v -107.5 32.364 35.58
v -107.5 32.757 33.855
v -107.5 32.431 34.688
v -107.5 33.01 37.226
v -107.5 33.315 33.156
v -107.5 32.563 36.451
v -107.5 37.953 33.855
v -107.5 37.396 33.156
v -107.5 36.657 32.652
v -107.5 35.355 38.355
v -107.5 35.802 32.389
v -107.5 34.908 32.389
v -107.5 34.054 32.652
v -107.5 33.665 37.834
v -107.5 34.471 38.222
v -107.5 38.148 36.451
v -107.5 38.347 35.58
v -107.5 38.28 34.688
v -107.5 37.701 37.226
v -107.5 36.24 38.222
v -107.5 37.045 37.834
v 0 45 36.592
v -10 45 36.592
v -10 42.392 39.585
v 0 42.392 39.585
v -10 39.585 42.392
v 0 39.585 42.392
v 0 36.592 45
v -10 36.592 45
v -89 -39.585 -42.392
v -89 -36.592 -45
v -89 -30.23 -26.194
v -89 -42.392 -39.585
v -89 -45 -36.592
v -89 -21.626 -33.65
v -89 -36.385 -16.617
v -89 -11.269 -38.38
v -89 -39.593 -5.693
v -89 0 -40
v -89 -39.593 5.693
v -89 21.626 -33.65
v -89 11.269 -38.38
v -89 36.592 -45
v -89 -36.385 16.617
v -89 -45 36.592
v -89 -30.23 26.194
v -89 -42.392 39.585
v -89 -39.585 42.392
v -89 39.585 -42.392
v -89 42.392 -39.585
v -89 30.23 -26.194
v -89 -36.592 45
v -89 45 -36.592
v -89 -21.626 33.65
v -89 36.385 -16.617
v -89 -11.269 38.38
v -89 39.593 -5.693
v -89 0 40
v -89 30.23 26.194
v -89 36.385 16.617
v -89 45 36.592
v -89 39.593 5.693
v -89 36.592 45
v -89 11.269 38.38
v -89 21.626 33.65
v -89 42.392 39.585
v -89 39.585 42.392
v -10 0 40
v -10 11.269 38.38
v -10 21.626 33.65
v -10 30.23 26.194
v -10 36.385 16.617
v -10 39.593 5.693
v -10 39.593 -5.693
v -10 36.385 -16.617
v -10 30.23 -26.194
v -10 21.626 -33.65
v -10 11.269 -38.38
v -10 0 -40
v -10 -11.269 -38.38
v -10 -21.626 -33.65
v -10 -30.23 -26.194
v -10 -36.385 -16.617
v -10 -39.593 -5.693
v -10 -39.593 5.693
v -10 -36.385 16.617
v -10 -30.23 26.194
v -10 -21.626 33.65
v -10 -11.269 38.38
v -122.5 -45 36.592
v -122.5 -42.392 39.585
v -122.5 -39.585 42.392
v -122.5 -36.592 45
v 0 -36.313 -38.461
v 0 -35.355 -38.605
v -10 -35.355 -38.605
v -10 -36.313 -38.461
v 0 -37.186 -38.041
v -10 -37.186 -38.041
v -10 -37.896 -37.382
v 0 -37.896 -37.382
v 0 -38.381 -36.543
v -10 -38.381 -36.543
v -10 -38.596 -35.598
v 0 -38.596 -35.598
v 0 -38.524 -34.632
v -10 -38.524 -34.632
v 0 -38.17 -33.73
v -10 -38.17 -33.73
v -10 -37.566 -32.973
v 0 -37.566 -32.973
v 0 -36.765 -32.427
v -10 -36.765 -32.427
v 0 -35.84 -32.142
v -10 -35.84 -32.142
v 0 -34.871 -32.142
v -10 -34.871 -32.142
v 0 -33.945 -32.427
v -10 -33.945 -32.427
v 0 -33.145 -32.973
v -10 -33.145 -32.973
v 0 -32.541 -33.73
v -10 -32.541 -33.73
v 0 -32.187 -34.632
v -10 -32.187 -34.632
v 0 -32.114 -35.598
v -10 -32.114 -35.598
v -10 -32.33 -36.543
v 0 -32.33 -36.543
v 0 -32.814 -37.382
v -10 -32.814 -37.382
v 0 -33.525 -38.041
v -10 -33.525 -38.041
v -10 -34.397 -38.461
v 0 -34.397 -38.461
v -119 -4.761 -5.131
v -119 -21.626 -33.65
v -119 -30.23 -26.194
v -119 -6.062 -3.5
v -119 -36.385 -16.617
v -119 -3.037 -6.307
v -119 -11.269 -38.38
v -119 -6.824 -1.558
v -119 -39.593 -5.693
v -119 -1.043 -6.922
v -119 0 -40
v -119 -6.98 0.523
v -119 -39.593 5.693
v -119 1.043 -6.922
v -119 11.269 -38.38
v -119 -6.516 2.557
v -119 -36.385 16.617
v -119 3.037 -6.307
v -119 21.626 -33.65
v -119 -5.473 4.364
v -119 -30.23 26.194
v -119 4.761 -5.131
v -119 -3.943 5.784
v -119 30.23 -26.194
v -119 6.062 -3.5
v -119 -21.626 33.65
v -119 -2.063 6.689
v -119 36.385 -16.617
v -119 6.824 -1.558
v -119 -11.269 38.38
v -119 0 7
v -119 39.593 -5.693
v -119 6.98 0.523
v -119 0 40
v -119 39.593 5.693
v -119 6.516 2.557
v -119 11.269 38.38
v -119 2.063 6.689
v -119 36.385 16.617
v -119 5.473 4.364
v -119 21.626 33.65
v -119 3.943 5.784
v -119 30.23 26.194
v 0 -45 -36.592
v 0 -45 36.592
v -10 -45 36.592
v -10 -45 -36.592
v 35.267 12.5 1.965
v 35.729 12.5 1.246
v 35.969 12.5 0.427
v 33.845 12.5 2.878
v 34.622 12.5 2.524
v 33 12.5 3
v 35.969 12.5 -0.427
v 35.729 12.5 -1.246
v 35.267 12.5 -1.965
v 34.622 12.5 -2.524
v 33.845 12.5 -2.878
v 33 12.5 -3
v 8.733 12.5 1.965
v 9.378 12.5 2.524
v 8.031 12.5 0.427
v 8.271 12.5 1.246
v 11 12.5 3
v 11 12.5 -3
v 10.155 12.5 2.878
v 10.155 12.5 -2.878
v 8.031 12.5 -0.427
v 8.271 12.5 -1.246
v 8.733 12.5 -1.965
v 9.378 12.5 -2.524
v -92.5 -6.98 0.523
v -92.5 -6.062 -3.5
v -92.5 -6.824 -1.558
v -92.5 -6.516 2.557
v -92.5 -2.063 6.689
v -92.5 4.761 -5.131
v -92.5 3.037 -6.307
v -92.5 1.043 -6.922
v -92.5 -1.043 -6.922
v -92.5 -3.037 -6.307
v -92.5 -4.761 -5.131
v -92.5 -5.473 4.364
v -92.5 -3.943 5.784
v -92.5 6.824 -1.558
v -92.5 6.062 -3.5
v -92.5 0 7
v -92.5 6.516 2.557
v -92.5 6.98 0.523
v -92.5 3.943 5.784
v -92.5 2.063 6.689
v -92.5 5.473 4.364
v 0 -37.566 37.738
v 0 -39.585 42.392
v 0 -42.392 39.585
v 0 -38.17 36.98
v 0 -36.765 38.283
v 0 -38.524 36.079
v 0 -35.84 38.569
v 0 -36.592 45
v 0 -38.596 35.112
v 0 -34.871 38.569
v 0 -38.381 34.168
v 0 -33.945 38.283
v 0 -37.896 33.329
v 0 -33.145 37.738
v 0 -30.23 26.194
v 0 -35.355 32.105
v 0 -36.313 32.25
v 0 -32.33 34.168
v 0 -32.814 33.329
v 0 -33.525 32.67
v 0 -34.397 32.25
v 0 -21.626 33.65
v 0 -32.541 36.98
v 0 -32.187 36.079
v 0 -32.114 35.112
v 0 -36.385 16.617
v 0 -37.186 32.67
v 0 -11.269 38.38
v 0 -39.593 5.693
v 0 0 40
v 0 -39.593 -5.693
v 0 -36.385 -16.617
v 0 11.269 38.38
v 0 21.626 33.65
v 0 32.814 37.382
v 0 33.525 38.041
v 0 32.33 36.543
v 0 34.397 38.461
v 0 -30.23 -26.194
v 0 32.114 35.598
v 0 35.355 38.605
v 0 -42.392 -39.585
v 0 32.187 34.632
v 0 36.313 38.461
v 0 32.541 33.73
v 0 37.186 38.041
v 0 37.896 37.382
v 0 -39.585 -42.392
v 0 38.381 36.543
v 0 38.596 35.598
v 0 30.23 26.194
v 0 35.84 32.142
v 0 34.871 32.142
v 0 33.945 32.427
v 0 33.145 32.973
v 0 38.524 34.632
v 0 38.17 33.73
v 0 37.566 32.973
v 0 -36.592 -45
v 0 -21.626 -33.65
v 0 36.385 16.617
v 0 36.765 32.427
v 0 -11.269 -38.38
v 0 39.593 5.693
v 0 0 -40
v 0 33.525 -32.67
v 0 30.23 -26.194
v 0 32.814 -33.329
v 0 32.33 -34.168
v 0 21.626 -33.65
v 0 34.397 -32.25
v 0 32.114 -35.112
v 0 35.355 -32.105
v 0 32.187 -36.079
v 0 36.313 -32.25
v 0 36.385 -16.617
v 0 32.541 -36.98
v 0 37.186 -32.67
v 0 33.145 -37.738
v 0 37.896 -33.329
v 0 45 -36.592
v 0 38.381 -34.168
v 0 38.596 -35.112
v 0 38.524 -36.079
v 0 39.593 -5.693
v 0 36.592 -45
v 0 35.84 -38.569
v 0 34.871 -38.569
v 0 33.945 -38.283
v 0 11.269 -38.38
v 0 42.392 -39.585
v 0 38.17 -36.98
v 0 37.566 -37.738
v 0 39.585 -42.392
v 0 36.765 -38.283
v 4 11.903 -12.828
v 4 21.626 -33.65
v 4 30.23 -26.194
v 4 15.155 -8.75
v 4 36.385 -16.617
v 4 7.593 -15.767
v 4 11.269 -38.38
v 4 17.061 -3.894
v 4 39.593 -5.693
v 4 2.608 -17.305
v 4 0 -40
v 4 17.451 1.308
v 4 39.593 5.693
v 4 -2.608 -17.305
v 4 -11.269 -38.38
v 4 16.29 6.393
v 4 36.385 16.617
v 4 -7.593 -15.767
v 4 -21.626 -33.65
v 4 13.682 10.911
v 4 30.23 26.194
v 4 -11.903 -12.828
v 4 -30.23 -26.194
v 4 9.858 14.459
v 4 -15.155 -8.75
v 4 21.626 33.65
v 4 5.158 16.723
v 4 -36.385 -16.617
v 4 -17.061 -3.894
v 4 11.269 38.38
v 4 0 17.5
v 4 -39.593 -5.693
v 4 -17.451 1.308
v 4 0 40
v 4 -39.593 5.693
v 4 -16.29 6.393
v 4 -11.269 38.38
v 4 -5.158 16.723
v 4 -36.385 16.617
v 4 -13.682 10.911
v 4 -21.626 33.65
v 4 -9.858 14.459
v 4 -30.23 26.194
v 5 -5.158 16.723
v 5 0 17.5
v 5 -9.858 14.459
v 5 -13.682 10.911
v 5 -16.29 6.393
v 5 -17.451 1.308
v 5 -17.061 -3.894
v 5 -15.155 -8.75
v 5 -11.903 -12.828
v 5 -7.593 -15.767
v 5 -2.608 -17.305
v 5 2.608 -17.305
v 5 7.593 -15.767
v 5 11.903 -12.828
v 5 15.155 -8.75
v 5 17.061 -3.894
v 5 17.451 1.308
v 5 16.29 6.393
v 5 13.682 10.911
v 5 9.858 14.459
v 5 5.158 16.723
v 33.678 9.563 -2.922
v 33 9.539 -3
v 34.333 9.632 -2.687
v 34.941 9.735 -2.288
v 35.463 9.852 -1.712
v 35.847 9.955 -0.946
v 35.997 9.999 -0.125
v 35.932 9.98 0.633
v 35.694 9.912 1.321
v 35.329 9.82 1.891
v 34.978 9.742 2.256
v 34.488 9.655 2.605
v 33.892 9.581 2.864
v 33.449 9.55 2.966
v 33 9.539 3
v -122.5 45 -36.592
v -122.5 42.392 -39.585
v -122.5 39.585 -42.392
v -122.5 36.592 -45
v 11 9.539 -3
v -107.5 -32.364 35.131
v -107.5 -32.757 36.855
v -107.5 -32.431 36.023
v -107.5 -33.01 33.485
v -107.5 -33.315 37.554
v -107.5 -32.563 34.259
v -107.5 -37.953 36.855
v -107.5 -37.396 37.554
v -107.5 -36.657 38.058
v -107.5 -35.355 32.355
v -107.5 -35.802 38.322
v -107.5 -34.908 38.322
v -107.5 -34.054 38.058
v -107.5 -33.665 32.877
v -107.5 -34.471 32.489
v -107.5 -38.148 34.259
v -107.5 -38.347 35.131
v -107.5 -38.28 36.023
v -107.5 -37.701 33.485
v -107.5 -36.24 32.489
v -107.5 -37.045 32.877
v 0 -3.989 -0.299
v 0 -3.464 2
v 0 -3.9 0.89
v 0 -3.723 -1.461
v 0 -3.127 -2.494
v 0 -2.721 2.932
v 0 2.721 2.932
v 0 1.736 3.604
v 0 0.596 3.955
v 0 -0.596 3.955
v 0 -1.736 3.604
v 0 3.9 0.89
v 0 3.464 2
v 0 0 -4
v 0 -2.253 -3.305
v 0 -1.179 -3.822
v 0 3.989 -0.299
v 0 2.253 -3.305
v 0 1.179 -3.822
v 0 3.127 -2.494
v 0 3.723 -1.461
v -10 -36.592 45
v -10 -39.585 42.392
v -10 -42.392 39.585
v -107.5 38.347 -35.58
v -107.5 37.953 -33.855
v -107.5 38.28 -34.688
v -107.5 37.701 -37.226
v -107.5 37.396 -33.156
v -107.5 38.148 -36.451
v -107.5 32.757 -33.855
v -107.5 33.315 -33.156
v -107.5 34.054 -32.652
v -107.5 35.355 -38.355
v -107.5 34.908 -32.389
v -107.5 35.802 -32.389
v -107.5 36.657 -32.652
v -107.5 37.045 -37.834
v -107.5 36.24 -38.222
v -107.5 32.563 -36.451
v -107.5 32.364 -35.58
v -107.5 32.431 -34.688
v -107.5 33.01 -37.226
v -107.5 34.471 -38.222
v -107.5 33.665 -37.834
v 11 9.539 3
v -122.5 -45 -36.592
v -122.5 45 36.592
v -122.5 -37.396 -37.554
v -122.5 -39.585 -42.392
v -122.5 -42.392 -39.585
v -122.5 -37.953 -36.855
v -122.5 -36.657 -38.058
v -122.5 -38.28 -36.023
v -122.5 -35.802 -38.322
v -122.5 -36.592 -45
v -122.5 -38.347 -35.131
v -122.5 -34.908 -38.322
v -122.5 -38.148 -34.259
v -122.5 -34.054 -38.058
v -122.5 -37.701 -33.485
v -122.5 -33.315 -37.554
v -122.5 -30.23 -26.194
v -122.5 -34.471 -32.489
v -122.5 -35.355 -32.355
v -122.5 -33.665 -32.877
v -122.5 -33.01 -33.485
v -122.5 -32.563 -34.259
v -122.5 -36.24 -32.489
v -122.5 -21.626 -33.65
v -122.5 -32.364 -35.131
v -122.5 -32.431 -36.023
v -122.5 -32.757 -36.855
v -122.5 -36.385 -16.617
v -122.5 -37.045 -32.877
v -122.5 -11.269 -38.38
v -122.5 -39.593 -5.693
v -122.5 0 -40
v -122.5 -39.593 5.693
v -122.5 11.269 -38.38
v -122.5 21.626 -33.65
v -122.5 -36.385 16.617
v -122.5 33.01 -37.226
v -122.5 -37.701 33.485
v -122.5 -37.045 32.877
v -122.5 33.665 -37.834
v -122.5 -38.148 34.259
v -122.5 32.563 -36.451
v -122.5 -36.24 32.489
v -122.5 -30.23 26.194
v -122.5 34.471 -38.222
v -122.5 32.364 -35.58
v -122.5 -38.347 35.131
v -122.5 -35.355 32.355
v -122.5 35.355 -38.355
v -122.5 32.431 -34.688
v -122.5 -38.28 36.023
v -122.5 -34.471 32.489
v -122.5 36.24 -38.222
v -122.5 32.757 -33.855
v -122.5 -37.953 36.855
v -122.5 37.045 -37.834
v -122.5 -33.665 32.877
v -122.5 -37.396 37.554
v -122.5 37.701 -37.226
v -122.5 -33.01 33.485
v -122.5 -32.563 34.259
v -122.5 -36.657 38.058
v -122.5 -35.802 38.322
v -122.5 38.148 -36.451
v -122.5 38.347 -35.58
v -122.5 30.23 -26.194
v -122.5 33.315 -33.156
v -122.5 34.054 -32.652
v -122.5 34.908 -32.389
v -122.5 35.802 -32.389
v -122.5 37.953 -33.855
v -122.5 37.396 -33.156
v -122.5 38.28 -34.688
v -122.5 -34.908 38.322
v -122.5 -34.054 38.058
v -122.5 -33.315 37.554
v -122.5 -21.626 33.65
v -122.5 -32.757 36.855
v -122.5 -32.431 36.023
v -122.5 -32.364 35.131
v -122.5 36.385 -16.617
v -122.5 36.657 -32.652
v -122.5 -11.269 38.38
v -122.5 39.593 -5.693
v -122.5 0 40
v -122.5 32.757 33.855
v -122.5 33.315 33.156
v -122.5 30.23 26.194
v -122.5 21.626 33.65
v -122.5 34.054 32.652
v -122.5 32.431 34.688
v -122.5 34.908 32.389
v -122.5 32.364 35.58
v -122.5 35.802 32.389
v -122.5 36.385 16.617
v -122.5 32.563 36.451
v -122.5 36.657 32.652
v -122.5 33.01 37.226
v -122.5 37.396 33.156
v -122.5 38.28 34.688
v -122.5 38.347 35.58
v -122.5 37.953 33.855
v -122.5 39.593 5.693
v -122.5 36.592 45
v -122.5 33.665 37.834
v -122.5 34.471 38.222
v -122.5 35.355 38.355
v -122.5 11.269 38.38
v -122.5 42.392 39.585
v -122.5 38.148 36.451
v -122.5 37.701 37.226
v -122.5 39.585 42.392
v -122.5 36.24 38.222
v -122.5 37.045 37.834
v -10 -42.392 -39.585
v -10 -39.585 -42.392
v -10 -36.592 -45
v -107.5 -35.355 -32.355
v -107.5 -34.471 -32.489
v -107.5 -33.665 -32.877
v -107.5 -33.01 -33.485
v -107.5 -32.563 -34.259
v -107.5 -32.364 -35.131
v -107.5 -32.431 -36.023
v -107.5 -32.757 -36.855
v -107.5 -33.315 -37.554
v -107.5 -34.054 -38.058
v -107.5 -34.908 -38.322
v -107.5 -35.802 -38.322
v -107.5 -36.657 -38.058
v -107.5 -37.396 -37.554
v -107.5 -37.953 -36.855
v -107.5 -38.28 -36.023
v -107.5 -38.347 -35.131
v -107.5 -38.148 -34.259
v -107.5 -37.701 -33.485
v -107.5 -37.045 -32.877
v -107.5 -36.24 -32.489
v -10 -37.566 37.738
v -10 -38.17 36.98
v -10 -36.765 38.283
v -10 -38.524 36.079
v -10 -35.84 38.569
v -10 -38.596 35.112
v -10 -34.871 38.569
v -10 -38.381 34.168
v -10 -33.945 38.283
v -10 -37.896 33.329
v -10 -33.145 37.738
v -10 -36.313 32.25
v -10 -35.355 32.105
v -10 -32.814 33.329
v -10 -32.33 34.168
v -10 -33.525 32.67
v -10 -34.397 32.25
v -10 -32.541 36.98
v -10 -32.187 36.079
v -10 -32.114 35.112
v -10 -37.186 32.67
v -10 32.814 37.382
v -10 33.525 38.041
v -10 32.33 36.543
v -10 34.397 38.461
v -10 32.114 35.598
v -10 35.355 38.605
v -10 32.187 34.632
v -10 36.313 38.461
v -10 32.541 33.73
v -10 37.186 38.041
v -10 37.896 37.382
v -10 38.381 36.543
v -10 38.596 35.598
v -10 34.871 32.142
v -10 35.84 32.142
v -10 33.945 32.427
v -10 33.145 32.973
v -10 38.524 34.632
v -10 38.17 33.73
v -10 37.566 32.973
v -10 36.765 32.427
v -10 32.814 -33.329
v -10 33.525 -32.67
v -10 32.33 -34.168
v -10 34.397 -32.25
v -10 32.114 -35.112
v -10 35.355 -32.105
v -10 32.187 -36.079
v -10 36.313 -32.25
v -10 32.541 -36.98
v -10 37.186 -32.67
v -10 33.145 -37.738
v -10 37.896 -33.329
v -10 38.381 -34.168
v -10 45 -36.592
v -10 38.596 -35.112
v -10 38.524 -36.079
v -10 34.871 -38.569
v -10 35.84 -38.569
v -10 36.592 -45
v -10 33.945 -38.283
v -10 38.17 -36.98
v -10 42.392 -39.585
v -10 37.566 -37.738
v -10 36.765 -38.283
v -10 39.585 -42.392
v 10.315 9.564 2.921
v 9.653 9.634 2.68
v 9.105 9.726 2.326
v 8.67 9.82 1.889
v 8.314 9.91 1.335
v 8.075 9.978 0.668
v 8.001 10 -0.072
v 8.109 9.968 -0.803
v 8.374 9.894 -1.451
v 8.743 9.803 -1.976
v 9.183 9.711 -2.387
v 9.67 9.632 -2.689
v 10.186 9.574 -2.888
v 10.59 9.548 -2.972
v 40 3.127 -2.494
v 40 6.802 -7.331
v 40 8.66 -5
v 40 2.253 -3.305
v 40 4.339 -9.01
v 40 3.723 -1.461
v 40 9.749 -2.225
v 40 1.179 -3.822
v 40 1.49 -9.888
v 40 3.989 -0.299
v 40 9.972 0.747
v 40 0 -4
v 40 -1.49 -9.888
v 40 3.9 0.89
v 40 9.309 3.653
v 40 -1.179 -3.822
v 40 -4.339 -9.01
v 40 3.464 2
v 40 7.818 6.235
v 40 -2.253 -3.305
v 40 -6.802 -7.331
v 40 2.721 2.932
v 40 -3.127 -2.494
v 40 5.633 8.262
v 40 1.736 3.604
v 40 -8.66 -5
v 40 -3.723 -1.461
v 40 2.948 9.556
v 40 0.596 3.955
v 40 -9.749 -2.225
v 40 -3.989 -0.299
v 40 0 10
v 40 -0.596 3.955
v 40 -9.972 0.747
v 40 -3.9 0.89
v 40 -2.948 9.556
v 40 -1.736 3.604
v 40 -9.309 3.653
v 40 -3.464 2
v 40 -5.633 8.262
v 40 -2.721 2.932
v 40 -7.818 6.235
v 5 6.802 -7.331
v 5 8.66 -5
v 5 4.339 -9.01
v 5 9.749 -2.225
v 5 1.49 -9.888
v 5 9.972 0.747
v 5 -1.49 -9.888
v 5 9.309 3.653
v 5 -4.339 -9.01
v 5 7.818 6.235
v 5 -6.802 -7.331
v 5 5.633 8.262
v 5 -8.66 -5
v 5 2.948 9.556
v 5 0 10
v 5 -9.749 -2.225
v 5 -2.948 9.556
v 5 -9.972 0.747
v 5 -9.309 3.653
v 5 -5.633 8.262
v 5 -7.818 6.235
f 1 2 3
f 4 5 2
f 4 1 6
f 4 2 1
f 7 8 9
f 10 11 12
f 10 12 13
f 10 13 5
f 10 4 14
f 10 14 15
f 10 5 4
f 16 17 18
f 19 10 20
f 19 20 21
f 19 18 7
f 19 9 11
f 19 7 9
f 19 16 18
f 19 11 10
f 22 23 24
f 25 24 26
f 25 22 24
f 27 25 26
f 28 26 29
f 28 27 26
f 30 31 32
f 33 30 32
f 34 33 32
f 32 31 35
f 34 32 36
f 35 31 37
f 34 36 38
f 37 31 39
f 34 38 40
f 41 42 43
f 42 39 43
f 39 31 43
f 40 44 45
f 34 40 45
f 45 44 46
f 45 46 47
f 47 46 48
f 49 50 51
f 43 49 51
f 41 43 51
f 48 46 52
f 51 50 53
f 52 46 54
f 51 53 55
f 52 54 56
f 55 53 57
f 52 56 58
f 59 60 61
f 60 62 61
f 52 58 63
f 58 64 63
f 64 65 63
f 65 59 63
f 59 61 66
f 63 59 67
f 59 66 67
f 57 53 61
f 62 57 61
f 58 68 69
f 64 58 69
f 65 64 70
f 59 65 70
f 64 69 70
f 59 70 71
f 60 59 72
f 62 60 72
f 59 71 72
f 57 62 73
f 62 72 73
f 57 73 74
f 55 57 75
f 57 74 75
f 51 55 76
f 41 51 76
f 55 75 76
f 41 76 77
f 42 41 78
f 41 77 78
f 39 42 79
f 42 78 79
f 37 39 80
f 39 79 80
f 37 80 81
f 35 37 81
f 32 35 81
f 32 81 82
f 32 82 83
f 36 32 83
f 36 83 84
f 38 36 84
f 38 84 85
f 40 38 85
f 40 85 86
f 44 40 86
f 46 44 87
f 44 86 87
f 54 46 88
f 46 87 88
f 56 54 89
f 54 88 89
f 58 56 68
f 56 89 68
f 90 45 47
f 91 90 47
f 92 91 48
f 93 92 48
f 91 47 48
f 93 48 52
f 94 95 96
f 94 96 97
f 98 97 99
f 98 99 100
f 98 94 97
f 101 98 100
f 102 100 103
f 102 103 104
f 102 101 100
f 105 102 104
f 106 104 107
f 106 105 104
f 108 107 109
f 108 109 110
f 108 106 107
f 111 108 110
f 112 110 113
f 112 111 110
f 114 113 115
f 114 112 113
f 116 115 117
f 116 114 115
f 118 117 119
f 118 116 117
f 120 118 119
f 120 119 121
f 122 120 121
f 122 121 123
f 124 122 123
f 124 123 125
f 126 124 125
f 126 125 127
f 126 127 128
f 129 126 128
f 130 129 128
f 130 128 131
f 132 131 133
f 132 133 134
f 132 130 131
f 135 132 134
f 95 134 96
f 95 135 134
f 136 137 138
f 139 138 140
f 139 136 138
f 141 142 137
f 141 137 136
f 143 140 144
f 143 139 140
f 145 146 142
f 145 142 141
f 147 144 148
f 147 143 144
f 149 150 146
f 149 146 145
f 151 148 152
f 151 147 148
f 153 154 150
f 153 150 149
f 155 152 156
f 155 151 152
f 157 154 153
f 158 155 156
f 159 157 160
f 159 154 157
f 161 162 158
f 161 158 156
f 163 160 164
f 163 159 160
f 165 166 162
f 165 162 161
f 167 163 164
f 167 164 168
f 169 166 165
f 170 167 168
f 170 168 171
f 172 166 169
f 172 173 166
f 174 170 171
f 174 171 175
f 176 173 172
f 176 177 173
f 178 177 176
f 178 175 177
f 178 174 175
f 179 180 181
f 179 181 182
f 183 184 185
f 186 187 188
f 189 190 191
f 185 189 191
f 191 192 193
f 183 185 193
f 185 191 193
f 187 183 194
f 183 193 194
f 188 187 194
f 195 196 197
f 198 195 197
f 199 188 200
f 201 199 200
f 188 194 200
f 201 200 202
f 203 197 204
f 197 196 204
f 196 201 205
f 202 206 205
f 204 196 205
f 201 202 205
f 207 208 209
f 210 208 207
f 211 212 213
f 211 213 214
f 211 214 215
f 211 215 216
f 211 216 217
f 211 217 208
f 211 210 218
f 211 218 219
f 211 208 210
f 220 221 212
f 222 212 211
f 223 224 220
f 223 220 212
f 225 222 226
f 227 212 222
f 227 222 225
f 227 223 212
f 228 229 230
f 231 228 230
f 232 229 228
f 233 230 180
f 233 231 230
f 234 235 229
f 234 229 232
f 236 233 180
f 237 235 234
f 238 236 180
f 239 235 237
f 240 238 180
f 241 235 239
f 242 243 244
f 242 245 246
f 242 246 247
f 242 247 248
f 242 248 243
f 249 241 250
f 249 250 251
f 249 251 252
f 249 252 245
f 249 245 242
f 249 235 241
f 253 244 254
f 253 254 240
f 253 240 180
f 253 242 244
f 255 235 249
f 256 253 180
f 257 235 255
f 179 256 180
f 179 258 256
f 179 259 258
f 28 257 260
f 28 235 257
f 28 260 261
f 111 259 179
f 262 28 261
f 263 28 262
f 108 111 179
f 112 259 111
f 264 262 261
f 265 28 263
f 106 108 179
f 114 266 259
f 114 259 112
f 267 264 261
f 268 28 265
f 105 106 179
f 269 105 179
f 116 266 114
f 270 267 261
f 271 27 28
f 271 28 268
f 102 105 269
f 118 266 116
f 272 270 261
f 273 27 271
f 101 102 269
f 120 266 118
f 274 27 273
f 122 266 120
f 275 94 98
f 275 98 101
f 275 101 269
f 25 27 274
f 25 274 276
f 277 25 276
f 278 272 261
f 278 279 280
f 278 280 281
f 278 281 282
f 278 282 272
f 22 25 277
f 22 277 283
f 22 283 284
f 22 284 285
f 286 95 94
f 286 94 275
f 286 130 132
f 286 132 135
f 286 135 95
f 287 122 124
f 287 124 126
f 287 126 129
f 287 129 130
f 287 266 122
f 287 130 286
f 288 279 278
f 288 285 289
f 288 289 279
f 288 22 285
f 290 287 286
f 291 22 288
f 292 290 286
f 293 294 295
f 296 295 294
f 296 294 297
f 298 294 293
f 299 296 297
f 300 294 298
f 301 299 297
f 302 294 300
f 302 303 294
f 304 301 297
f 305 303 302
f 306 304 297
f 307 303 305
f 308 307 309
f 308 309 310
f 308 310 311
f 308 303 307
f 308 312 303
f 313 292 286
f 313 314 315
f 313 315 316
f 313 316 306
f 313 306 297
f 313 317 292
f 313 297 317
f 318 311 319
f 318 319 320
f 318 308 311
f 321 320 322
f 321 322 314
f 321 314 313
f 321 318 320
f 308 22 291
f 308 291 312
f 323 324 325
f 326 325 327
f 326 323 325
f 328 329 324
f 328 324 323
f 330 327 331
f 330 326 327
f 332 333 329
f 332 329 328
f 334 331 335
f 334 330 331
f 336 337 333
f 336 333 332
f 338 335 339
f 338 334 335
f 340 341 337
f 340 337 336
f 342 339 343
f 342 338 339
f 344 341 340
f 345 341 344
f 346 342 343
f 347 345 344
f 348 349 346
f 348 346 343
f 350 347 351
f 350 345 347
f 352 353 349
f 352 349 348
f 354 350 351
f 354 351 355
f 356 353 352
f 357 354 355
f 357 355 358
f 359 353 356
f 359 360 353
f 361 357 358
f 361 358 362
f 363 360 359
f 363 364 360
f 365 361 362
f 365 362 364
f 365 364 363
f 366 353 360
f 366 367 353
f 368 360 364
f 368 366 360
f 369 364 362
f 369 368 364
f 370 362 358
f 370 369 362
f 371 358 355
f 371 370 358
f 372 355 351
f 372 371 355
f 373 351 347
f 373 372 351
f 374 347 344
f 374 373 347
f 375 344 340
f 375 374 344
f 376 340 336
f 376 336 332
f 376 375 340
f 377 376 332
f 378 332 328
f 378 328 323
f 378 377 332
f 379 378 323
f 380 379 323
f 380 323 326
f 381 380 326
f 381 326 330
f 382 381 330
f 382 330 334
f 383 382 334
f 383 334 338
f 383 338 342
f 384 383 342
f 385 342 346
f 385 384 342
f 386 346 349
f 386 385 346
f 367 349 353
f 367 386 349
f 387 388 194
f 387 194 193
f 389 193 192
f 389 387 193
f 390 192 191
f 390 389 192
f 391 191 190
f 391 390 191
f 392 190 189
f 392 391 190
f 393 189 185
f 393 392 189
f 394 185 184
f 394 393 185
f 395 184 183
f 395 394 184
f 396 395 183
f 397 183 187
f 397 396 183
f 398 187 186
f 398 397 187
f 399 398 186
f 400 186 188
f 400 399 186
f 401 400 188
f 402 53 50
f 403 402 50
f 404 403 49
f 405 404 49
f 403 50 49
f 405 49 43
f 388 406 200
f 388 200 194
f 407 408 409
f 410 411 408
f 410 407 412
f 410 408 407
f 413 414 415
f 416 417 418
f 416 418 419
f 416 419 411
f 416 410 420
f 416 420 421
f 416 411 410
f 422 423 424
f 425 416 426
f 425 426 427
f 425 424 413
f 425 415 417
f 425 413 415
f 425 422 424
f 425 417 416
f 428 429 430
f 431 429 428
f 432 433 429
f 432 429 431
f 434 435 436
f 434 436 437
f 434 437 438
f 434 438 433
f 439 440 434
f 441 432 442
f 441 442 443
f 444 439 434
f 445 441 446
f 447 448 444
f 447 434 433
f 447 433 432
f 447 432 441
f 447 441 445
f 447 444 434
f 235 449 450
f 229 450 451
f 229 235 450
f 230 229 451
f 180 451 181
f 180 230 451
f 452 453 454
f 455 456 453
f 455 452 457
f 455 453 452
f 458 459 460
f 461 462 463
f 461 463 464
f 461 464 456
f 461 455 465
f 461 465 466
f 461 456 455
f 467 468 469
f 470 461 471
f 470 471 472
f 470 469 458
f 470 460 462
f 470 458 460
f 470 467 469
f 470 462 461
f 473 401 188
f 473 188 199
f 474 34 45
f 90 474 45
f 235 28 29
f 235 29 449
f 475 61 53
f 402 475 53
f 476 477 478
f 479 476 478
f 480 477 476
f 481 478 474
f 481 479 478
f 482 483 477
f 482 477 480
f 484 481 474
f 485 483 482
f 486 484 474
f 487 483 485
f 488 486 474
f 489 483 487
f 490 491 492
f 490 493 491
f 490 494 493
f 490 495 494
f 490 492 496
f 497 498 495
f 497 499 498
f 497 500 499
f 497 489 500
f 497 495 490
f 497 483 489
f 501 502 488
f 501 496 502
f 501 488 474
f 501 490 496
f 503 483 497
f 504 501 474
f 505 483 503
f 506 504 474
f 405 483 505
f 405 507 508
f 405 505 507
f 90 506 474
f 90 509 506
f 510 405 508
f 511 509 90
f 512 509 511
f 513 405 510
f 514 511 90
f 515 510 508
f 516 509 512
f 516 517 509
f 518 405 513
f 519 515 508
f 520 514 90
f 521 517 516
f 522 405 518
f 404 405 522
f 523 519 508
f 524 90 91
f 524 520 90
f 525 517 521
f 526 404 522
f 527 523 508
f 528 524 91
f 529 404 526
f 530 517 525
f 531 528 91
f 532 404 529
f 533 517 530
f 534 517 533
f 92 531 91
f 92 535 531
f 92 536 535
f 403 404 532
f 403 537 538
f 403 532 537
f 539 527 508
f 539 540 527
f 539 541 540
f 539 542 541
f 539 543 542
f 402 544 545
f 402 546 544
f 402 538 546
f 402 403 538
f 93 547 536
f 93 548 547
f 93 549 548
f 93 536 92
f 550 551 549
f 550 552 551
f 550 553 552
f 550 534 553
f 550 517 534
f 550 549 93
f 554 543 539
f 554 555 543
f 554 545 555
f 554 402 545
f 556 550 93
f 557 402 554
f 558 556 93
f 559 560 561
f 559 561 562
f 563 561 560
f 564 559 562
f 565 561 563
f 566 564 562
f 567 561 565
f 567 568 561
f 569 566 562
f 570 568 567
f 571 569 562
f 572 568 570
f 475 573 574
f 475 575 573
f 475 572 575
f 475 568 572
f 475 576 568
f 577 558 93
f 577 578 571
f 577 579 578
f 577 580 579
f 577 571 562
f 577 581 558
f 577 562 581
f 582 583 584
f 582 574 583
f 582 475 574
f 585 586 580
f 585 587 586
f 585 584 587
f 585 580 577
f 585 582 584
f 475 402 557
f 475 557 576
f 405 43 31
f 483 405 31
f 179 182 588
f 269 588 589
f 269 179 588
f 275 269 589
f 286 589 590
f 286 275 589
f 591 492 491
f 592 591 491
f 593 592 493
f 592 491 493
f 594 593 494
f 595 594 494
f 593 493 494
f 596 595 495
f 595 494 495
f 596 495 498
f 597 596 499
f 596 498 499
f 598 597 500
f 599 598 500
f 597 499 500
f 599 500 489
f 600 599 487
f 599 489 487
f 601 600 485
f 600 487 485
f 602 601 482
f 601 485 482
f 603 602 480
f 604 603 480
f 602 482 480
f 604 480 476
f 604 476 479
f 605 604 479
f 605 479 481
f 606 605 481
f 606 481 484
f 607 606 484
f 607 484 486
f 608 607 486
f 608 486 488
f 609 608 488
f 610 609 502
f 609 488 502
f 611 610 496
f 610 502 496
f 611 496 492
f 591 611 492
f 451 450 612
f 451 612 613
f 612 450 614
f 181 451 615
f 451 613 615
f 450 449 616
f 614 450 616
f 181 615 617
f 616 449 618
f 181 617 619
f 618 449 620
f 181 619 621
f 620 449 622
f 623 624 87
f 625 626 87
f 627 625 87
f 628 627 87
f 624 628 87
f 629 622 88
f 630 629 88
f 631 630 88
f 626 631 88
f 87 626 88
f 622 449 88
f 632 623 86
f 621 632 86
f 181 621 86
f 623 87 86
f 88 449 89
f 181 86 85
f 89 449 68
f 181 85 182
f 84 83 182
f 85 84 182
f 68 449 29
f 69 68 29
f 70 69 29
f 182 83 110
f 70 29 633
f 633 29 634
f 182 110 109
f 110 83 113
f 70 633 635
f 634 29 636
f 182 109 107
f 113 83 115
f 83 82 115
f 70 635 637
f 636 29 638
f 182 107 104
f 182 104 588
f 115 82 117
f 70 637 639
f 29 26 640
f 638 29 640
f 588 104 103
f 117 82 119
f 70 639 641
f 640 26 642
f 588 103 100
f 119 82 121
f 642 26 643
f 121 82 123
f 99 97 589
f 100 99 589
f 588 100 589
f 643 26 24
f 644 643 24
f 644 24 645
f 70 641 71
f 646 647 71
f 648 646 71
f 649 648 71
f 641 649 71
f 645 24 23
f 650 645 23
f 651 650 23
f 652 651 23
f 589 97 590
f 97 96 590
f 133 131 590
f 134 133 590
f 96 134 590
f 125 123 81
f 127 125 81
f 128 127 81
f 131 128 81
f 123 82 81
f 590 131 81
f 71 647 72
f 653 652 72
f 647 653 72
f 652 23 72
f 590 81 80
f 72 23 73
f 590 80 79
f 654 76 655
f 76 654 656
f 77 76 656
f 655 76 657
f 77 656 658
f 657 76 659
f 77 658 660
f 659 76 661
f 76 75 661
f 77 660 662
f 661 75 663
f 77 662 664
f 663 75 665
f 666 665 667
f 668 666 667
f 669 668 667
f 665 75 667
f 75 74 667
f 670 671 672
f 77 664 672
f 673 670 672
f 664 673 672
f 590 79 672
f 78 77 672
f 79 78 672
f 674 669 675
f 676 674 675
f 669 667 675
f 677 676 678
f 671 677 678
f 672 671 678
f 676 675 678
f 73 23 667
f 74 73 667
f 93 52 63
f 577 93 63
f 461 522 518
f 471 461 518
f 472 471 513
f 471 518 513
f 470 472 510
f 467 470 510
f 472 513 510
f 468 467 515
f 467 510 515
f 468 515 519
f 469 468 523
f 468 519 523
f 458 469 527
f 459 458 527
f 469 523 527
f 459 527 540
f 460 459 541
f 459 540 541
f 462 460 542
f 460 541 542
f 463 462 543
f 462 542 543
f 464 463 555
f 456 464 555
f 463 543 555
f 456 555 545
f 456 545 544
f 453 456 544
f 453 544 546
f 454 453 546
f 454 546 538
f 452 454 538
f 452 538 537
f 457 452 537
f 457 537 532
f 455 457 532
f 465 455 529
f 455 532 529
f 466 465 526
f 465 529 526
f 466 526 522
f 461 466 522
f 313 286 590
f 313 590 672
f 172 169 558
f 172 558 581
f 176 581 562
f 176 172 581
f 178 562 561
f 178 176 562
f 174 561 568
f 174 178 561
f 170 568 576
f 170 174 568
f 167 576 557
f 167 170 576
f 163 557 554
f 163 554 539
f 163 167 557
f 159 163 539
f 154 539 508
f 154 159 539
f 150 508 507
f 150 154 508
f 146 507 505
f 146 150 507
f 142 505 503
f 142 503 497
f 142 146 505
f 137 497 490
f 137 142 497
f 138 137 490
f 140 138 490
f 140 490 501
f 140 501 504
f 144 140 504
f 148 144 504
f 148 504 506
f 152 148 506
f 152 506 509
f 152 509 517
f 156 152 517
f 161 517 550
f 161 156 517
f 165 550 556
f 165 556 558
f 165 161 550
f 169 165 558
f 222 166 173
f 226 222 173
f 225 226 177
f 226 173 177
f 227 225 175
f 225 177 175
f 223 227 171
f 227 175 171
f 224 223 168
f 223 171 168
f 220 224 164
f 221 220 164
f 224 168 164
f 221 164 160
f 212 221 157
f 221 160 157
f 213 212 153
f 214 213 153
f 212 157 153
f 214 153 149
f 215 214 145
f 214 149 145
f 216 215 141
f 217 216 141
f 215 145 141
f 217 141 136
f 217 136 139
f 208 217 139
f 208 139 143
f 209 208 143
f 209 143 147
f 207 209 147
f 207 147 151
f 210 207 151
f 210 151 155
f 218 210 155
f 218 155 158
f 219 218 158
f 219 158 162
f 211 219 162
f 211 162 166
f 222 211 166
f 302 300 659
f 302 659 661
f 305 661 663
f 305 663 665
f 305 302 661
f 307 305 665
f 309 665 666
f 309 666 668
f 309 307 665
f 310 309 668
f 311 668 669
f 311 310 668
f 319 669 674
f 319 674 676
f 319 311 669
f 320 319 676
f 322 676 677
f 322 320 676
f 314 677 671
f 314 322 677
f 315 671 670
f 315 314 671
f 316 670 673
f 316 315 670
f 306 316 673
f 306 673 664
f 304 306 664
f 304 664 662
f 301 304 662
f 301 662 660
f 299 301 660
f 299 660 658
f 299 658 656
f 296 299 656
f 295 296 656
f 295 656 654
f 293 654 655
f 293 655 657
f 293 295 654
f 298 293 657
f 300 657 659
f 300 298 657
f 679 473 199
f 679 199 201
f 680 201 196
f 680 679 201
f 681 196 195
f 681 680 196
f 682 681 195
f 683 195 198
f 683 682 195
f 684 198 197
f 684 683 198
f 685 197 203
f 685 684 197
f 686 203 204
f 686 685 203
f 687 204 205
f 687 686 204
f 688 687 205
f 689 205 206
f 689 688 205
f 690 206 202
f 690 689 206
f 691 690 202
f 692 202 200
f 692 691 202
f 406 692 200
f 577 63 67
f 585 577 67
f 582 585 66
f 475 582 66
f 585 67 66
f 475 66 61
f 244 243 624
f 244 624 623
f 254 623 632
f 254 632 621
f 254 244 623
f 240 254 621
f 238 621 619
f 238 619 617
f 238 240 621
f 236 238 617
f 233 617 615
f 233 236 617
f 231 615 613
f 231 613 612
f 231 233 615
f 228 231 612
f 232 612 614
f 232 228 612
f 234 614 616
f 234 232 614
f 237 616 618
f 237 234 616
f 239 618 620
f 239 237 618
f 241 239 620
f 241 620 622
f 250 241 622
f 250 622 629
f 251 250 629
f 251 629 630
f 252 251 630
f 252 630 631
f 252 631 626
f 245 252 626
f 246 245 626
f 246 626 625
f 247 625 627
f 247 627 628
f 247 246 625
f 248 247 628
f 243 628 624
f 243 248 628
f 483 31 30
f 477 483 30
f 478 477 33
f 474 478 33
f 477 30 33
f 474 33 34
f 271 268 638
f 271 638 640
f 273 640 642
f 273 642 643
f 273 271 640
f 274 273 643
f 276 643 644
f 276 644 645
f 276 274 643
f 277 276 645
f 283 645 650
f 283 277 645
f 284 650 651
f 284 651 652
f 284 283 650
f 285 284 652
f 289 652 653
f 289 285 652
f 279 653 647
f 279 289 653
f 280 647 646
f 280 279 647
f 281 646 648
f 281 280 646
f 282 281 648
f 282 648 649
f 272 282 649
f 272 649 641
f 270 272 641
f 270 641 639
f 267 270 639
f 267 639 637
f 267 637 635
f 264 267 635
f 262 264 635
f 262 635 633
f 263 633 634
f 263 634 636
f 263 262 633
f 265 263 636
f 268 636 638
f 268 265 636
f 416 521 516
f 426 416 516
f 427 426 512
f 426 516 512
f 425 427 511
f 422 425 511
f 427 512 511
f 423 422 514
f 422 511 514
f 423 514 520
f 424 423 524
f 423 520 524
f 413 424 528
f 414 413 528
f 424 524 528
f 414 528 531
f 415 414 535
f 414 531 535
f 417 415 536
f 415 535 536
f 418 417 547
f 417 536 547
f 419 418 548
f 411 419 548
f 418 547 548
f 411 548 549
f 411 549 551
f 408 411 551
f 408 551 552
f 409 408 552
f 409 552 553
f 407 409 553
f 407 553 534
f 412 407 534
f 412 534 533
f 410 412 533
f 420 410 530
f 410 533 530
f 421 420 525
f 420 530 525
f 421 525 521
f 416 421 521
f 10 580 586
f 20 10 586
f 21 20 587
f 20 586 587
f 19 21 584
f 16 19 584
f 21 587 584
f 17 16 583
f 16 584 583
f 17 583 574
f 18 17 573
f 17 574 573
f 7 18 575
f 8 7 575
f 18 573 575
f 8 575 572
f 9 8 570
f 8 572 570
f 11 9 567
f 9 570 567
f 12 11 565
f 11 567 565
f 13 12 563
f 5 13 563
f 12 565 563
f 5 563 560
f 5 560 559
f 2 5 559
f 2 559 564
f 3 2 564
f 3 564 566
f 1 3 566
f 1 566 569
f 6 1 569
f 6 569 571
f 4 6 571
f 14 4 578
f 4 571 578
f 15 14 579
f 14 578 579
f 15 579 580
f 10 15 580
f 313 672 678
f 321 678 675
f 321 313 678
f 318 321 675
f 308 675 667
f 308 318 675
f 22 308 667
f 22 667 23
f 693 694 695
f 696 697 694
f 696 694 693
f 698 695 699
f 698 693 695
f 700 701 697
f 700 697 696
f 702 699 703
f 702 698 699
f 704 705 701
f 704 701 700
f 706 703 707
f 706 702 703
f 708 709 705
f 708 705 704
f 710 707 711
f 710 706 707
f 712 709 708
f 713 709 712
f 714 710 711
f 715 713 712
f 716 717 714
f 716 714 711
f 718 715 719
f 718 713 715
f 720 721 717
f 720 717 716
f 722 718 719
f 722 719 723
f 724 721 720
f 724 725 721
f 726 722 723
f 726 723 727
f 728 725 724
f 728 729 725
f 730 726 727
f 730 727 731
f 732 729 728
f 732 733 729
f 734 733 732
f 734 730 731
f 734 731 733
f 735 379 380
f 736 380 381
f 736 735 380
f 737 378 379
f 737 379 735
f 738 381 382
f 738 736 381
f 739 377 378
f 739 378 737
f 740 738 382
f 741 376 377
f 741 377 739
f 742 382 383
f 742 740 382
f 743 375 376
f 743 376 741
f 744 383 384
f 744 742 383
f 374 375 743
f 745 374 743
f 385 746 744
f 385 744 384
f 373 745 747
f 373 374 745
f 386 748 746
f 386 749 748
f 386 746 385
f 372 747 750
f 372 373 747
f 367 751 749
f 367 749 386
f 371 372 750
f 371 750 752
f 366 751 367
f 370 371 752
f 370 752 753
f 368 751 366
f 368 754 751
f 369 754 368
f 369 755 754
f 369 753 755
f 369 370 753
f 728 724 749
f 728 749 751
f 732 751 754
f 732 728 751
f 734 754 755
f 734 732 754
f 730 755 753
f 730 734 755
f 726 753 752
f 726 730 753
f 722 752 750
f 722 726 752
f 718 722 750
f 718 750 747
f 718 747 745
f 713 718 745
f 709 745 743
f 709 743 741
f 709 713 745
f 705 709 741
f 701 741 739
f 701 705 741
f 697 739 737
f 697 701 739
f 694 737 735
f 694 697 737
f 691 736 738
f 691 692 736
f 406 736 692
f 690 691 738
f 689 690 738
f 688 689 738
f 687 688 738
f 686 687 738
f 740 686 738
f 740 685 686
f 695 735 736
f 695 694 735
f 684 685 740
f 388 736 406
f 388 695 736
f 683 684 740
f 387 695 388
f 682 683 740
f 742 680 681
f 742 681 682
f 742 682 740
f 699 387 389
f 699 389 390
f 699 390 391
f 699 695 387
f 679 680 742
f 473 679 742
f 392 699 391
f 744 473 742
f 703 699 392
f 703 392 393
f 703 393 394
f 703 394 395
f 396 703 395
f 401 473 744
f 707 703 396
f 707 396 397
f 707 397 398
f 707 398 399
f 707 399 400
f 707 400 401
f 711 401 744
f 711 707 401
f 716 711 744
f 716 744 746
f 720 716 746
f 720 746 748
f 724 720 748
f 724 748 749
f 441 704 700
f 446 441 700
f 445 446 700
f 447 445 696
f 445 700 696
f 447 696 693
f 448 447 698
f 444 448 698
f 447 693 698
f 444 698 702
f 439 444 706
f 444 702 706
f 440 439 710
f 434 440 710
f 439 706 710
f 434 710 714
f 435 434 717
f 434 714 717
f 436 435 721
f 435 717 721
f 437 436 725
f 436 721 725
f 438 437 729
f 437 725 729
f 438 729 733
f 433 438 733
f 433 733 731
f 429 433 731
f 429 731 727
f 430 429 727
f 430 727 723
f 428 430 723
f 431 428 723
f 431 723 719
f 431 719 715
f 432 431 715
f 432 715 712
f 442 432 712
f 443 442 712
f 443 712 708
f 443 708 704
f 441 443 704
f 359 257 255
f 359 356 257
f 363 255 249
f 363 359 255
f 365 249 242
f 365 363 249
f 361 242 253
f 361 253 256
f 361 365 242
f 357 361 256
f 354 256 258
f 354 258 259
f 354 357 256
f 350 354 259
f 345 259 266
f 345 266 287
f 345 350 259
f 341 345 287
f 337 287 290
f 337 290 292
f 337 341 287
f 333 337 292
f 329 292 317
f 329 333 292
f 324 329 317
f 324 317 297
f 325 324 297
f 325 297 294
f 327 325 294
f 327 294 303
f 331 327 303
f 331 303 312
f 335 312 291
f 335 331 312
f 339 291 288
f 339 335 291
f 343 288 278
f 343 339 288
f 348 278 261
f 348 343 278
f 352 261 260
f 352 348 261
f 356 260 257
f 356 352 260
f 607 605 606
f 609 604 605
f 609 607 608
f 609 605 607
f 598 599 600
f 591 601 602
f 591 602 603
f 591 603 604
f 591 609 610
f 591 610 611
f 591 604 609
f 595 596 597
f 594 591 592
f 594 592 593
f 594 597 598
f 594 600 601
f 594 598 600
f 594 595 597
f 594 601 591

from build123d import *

# Parameters (mm, degrees)
EXTRUDE_1_DEPTH     = 12.5
CUT_EXTRUDE_1_REACH = 71.282
SKETCH_3_R          = 4
SKETCH_4_R          = 3.25
EXTRUDE_2_DEPTH     = 10
SKETCH_5_R          = 40
EXTRUDE_3_DEPTH     = 79
EXTRUDE_4_DEPTH     = 33.5
CUT_EXTRUDE_START   = -3.5
SKETCH_7_R          = 40
CUT_EXTRUDE_2_DEPTH = 3.5
SKETCH_8_R          = 7
CUT_EXTRUDE_3_DEPTH = 30
SKETCH_9_R          = 3
CUT_EXTRUDE_4_DEPTH = 15


with BuildPart() as part:
    # 草图1 → 旋转1 (revolve)
    with BuildSketch(Plane.XY, mode=Mode.PRIVATE) as revolve_1_sk:
        Polygon((0, 0), (0, 40), (4, 40), (4, 17.5), (5, 17.5), (5, 10), (40, 10), (40, 0), align=None)
    revolve(revolve_1_sk.sketch.rotate(Axis((-53.526377828, 0, 0), (1, 0, 0)), 90), axis=Axis((-53.526377828, 0, 0), (1, 0, 0)))

    # 草图2 → 凸台-拉伸1 (add)
    with BuildSketch(Plane(origin=(0, 0, 0), x_dir=(1, 0, 0), z_dir=(0, 1, 0))):
        with BuildLine():
            Line((11, 3), (33, 3))
            ThreePointArc((33, 3), (36, 0), (33, -3))
            Line((33, -3), (11, -3))
            ThreePointArc((11, -3), (8, 0), (11, 3))
        make_face()
    extrude(amount=EXTRUDE_1_DEPTH)

    # 草图3 → 切除-拉伸1 (cut, up to next)
    with BuildSketch(Plane(origin=(40, 0, 0), x_dir=(0, 0, -1), z_dir=(1, 0, 0)), mode=Mode.PRIVATE) as cut_extrude_1_sk1:
        Circle(SKETCH_3_R)
    cut_extrude_1_tool1 = extrude(cut_extrude_1_sk1.sketch, amount=-CUT_EXTRUDE_1_REACH, mode=Mode.PRIVATE) & part.part
    add(cut_extrude_1_tool1.solids().sort_by_distance((40, 0, 0))[0], mode=Mode.SUBTRACT)

    # 草图4 → 凸台-拉伸2 (add)
    with BuildSketch(Plane.ZY):
        with BuildLine():
            Line((36.592348927, -45), (-36.592348927, -45))
            ThreePointArc((-36.592348927, -45), (-41.012193309, -41.012193309), (-45, -36.592348927))
            Line((-45, -36.592348927), (-45, 36.592348927))
            ThreePointArc((-45, 36.592348927), (-41.012193309, 41.012193309), (-36.592348927, 45))
            Line((-36.592348927, 45), (36.592348927, 45))
            ThreePointArc((36.592348927, 45), (41.012193309, 41.012193309), (45, 36.592348927))
            Line((45, 36.592348927), (45, -36.592348927))
            ThreePointArc((45, -36.592348927), (41.012193309, -41.012193309), (36.592348927, -45))
        make_face()
        with Locations((-35.355339059, 35.355339059)):
            Circle(SKETCH_4_R, mode=Mode.SUBTRACT)
        with Locations(Location((35.355339059, -35.355339059, 0), (0, 0, 180))):
            Circle(SKETCH_4_R, mode=Mode.SUBTRACT)
        with Locations((35.355339059, 35.355339059)):
            Circle(SKETCH_4_R, mode=Mode.SUBTRACT)
        with Locations(Location((-35.355339059, -35.355339059, 0), (0, 0, 180))):
            Circle(SKETCH_4_R, mode=Mode.SUBTRACT)
    extrude(amount=EXTRUDE_2_DEPTH)

    # 草图5 → 凸台-拉伸3 (add)
    with BuildSketch(Plane.ZY.offset(10)):
        Circle(SKETCH_5_R)
    extrude(amount=EXTRUDE_3_DEPTH)

    # 草图6 → 凸台-拉伸4 (add)
    with BuildSketch(Plane.ZY.offset(89)):
        with BuildLine():
            Line((36.592348927, 45), (-36.592348927, 45))
            ThreePointArc((-36.592348927, 45), (-41.012193309, 41.012193309), (-45, 36.592348927))
            Line((-45, 36.592348927), (-45, -36.592348927))
            ThreePointArc((-45, -36.592348927), (-41.012193309, -41.012193309), (-36.592348927, -45))
            Line((-36.592348927, -45), (36.592348927, -45))
            ThreePointArc((36.592348927, -45), (41.012193309, -41.012193309), (45, -36.592348927))
            Line((45, -36.592348927), (45, 36.592348927))
            ThreePointArc((45, 36.592348927), (41.012193309, 41.012193309), (36.592348927, 45))
        make_face()
    extrude(amount=EXTRUDE_4_DEPTH)

    # 草图7 → 切除-拉伸2 (cut)
    with BuildSketch(Plane.ZY.offset(122.5).offset(CUT_EXTRUDE_START)):
        Circle(SKETCH_7_R)
    extrude(amount=CUT_EXTRUDE_2_DEPTH, mode=Mode.SUBTRACT)

    # 草图8 → 切除-拉伸3 (cut)
    with BuildSketch(Plane.ZY.offset(122.5)):
        Circle(SKETCH_8_R)
    extrude(amount=-CUT_EXTRUDE_3_DEPTH, mode=Mode.SUBTRACT)

    # 草图9 → 切除-拉伸4 (cut)
    with BuildSketch(Plane.ZY.offset(122.5)):
        with Locations((35.355339059, 35.355339059)):
            Circle(SKETCH_9_R)
        with Locations(Location((-35.355339059, 35.355339059, 0), (0, 0, 180))):
            Circle(SKETCH_9_R)
        with Locations(Location((35.355339059, -35.355339059, 0), (0, 0, 180))):
            Circle(SKETCH_9_R)
        with Locations((-35.355339059, -35.355339059)):
            Circle(SKETCH_9_R)
    extrude(amount=-CUT_EXTRUDE_4_DEPTH, mode=Mode.SUBTRACT)


solid = part.part
